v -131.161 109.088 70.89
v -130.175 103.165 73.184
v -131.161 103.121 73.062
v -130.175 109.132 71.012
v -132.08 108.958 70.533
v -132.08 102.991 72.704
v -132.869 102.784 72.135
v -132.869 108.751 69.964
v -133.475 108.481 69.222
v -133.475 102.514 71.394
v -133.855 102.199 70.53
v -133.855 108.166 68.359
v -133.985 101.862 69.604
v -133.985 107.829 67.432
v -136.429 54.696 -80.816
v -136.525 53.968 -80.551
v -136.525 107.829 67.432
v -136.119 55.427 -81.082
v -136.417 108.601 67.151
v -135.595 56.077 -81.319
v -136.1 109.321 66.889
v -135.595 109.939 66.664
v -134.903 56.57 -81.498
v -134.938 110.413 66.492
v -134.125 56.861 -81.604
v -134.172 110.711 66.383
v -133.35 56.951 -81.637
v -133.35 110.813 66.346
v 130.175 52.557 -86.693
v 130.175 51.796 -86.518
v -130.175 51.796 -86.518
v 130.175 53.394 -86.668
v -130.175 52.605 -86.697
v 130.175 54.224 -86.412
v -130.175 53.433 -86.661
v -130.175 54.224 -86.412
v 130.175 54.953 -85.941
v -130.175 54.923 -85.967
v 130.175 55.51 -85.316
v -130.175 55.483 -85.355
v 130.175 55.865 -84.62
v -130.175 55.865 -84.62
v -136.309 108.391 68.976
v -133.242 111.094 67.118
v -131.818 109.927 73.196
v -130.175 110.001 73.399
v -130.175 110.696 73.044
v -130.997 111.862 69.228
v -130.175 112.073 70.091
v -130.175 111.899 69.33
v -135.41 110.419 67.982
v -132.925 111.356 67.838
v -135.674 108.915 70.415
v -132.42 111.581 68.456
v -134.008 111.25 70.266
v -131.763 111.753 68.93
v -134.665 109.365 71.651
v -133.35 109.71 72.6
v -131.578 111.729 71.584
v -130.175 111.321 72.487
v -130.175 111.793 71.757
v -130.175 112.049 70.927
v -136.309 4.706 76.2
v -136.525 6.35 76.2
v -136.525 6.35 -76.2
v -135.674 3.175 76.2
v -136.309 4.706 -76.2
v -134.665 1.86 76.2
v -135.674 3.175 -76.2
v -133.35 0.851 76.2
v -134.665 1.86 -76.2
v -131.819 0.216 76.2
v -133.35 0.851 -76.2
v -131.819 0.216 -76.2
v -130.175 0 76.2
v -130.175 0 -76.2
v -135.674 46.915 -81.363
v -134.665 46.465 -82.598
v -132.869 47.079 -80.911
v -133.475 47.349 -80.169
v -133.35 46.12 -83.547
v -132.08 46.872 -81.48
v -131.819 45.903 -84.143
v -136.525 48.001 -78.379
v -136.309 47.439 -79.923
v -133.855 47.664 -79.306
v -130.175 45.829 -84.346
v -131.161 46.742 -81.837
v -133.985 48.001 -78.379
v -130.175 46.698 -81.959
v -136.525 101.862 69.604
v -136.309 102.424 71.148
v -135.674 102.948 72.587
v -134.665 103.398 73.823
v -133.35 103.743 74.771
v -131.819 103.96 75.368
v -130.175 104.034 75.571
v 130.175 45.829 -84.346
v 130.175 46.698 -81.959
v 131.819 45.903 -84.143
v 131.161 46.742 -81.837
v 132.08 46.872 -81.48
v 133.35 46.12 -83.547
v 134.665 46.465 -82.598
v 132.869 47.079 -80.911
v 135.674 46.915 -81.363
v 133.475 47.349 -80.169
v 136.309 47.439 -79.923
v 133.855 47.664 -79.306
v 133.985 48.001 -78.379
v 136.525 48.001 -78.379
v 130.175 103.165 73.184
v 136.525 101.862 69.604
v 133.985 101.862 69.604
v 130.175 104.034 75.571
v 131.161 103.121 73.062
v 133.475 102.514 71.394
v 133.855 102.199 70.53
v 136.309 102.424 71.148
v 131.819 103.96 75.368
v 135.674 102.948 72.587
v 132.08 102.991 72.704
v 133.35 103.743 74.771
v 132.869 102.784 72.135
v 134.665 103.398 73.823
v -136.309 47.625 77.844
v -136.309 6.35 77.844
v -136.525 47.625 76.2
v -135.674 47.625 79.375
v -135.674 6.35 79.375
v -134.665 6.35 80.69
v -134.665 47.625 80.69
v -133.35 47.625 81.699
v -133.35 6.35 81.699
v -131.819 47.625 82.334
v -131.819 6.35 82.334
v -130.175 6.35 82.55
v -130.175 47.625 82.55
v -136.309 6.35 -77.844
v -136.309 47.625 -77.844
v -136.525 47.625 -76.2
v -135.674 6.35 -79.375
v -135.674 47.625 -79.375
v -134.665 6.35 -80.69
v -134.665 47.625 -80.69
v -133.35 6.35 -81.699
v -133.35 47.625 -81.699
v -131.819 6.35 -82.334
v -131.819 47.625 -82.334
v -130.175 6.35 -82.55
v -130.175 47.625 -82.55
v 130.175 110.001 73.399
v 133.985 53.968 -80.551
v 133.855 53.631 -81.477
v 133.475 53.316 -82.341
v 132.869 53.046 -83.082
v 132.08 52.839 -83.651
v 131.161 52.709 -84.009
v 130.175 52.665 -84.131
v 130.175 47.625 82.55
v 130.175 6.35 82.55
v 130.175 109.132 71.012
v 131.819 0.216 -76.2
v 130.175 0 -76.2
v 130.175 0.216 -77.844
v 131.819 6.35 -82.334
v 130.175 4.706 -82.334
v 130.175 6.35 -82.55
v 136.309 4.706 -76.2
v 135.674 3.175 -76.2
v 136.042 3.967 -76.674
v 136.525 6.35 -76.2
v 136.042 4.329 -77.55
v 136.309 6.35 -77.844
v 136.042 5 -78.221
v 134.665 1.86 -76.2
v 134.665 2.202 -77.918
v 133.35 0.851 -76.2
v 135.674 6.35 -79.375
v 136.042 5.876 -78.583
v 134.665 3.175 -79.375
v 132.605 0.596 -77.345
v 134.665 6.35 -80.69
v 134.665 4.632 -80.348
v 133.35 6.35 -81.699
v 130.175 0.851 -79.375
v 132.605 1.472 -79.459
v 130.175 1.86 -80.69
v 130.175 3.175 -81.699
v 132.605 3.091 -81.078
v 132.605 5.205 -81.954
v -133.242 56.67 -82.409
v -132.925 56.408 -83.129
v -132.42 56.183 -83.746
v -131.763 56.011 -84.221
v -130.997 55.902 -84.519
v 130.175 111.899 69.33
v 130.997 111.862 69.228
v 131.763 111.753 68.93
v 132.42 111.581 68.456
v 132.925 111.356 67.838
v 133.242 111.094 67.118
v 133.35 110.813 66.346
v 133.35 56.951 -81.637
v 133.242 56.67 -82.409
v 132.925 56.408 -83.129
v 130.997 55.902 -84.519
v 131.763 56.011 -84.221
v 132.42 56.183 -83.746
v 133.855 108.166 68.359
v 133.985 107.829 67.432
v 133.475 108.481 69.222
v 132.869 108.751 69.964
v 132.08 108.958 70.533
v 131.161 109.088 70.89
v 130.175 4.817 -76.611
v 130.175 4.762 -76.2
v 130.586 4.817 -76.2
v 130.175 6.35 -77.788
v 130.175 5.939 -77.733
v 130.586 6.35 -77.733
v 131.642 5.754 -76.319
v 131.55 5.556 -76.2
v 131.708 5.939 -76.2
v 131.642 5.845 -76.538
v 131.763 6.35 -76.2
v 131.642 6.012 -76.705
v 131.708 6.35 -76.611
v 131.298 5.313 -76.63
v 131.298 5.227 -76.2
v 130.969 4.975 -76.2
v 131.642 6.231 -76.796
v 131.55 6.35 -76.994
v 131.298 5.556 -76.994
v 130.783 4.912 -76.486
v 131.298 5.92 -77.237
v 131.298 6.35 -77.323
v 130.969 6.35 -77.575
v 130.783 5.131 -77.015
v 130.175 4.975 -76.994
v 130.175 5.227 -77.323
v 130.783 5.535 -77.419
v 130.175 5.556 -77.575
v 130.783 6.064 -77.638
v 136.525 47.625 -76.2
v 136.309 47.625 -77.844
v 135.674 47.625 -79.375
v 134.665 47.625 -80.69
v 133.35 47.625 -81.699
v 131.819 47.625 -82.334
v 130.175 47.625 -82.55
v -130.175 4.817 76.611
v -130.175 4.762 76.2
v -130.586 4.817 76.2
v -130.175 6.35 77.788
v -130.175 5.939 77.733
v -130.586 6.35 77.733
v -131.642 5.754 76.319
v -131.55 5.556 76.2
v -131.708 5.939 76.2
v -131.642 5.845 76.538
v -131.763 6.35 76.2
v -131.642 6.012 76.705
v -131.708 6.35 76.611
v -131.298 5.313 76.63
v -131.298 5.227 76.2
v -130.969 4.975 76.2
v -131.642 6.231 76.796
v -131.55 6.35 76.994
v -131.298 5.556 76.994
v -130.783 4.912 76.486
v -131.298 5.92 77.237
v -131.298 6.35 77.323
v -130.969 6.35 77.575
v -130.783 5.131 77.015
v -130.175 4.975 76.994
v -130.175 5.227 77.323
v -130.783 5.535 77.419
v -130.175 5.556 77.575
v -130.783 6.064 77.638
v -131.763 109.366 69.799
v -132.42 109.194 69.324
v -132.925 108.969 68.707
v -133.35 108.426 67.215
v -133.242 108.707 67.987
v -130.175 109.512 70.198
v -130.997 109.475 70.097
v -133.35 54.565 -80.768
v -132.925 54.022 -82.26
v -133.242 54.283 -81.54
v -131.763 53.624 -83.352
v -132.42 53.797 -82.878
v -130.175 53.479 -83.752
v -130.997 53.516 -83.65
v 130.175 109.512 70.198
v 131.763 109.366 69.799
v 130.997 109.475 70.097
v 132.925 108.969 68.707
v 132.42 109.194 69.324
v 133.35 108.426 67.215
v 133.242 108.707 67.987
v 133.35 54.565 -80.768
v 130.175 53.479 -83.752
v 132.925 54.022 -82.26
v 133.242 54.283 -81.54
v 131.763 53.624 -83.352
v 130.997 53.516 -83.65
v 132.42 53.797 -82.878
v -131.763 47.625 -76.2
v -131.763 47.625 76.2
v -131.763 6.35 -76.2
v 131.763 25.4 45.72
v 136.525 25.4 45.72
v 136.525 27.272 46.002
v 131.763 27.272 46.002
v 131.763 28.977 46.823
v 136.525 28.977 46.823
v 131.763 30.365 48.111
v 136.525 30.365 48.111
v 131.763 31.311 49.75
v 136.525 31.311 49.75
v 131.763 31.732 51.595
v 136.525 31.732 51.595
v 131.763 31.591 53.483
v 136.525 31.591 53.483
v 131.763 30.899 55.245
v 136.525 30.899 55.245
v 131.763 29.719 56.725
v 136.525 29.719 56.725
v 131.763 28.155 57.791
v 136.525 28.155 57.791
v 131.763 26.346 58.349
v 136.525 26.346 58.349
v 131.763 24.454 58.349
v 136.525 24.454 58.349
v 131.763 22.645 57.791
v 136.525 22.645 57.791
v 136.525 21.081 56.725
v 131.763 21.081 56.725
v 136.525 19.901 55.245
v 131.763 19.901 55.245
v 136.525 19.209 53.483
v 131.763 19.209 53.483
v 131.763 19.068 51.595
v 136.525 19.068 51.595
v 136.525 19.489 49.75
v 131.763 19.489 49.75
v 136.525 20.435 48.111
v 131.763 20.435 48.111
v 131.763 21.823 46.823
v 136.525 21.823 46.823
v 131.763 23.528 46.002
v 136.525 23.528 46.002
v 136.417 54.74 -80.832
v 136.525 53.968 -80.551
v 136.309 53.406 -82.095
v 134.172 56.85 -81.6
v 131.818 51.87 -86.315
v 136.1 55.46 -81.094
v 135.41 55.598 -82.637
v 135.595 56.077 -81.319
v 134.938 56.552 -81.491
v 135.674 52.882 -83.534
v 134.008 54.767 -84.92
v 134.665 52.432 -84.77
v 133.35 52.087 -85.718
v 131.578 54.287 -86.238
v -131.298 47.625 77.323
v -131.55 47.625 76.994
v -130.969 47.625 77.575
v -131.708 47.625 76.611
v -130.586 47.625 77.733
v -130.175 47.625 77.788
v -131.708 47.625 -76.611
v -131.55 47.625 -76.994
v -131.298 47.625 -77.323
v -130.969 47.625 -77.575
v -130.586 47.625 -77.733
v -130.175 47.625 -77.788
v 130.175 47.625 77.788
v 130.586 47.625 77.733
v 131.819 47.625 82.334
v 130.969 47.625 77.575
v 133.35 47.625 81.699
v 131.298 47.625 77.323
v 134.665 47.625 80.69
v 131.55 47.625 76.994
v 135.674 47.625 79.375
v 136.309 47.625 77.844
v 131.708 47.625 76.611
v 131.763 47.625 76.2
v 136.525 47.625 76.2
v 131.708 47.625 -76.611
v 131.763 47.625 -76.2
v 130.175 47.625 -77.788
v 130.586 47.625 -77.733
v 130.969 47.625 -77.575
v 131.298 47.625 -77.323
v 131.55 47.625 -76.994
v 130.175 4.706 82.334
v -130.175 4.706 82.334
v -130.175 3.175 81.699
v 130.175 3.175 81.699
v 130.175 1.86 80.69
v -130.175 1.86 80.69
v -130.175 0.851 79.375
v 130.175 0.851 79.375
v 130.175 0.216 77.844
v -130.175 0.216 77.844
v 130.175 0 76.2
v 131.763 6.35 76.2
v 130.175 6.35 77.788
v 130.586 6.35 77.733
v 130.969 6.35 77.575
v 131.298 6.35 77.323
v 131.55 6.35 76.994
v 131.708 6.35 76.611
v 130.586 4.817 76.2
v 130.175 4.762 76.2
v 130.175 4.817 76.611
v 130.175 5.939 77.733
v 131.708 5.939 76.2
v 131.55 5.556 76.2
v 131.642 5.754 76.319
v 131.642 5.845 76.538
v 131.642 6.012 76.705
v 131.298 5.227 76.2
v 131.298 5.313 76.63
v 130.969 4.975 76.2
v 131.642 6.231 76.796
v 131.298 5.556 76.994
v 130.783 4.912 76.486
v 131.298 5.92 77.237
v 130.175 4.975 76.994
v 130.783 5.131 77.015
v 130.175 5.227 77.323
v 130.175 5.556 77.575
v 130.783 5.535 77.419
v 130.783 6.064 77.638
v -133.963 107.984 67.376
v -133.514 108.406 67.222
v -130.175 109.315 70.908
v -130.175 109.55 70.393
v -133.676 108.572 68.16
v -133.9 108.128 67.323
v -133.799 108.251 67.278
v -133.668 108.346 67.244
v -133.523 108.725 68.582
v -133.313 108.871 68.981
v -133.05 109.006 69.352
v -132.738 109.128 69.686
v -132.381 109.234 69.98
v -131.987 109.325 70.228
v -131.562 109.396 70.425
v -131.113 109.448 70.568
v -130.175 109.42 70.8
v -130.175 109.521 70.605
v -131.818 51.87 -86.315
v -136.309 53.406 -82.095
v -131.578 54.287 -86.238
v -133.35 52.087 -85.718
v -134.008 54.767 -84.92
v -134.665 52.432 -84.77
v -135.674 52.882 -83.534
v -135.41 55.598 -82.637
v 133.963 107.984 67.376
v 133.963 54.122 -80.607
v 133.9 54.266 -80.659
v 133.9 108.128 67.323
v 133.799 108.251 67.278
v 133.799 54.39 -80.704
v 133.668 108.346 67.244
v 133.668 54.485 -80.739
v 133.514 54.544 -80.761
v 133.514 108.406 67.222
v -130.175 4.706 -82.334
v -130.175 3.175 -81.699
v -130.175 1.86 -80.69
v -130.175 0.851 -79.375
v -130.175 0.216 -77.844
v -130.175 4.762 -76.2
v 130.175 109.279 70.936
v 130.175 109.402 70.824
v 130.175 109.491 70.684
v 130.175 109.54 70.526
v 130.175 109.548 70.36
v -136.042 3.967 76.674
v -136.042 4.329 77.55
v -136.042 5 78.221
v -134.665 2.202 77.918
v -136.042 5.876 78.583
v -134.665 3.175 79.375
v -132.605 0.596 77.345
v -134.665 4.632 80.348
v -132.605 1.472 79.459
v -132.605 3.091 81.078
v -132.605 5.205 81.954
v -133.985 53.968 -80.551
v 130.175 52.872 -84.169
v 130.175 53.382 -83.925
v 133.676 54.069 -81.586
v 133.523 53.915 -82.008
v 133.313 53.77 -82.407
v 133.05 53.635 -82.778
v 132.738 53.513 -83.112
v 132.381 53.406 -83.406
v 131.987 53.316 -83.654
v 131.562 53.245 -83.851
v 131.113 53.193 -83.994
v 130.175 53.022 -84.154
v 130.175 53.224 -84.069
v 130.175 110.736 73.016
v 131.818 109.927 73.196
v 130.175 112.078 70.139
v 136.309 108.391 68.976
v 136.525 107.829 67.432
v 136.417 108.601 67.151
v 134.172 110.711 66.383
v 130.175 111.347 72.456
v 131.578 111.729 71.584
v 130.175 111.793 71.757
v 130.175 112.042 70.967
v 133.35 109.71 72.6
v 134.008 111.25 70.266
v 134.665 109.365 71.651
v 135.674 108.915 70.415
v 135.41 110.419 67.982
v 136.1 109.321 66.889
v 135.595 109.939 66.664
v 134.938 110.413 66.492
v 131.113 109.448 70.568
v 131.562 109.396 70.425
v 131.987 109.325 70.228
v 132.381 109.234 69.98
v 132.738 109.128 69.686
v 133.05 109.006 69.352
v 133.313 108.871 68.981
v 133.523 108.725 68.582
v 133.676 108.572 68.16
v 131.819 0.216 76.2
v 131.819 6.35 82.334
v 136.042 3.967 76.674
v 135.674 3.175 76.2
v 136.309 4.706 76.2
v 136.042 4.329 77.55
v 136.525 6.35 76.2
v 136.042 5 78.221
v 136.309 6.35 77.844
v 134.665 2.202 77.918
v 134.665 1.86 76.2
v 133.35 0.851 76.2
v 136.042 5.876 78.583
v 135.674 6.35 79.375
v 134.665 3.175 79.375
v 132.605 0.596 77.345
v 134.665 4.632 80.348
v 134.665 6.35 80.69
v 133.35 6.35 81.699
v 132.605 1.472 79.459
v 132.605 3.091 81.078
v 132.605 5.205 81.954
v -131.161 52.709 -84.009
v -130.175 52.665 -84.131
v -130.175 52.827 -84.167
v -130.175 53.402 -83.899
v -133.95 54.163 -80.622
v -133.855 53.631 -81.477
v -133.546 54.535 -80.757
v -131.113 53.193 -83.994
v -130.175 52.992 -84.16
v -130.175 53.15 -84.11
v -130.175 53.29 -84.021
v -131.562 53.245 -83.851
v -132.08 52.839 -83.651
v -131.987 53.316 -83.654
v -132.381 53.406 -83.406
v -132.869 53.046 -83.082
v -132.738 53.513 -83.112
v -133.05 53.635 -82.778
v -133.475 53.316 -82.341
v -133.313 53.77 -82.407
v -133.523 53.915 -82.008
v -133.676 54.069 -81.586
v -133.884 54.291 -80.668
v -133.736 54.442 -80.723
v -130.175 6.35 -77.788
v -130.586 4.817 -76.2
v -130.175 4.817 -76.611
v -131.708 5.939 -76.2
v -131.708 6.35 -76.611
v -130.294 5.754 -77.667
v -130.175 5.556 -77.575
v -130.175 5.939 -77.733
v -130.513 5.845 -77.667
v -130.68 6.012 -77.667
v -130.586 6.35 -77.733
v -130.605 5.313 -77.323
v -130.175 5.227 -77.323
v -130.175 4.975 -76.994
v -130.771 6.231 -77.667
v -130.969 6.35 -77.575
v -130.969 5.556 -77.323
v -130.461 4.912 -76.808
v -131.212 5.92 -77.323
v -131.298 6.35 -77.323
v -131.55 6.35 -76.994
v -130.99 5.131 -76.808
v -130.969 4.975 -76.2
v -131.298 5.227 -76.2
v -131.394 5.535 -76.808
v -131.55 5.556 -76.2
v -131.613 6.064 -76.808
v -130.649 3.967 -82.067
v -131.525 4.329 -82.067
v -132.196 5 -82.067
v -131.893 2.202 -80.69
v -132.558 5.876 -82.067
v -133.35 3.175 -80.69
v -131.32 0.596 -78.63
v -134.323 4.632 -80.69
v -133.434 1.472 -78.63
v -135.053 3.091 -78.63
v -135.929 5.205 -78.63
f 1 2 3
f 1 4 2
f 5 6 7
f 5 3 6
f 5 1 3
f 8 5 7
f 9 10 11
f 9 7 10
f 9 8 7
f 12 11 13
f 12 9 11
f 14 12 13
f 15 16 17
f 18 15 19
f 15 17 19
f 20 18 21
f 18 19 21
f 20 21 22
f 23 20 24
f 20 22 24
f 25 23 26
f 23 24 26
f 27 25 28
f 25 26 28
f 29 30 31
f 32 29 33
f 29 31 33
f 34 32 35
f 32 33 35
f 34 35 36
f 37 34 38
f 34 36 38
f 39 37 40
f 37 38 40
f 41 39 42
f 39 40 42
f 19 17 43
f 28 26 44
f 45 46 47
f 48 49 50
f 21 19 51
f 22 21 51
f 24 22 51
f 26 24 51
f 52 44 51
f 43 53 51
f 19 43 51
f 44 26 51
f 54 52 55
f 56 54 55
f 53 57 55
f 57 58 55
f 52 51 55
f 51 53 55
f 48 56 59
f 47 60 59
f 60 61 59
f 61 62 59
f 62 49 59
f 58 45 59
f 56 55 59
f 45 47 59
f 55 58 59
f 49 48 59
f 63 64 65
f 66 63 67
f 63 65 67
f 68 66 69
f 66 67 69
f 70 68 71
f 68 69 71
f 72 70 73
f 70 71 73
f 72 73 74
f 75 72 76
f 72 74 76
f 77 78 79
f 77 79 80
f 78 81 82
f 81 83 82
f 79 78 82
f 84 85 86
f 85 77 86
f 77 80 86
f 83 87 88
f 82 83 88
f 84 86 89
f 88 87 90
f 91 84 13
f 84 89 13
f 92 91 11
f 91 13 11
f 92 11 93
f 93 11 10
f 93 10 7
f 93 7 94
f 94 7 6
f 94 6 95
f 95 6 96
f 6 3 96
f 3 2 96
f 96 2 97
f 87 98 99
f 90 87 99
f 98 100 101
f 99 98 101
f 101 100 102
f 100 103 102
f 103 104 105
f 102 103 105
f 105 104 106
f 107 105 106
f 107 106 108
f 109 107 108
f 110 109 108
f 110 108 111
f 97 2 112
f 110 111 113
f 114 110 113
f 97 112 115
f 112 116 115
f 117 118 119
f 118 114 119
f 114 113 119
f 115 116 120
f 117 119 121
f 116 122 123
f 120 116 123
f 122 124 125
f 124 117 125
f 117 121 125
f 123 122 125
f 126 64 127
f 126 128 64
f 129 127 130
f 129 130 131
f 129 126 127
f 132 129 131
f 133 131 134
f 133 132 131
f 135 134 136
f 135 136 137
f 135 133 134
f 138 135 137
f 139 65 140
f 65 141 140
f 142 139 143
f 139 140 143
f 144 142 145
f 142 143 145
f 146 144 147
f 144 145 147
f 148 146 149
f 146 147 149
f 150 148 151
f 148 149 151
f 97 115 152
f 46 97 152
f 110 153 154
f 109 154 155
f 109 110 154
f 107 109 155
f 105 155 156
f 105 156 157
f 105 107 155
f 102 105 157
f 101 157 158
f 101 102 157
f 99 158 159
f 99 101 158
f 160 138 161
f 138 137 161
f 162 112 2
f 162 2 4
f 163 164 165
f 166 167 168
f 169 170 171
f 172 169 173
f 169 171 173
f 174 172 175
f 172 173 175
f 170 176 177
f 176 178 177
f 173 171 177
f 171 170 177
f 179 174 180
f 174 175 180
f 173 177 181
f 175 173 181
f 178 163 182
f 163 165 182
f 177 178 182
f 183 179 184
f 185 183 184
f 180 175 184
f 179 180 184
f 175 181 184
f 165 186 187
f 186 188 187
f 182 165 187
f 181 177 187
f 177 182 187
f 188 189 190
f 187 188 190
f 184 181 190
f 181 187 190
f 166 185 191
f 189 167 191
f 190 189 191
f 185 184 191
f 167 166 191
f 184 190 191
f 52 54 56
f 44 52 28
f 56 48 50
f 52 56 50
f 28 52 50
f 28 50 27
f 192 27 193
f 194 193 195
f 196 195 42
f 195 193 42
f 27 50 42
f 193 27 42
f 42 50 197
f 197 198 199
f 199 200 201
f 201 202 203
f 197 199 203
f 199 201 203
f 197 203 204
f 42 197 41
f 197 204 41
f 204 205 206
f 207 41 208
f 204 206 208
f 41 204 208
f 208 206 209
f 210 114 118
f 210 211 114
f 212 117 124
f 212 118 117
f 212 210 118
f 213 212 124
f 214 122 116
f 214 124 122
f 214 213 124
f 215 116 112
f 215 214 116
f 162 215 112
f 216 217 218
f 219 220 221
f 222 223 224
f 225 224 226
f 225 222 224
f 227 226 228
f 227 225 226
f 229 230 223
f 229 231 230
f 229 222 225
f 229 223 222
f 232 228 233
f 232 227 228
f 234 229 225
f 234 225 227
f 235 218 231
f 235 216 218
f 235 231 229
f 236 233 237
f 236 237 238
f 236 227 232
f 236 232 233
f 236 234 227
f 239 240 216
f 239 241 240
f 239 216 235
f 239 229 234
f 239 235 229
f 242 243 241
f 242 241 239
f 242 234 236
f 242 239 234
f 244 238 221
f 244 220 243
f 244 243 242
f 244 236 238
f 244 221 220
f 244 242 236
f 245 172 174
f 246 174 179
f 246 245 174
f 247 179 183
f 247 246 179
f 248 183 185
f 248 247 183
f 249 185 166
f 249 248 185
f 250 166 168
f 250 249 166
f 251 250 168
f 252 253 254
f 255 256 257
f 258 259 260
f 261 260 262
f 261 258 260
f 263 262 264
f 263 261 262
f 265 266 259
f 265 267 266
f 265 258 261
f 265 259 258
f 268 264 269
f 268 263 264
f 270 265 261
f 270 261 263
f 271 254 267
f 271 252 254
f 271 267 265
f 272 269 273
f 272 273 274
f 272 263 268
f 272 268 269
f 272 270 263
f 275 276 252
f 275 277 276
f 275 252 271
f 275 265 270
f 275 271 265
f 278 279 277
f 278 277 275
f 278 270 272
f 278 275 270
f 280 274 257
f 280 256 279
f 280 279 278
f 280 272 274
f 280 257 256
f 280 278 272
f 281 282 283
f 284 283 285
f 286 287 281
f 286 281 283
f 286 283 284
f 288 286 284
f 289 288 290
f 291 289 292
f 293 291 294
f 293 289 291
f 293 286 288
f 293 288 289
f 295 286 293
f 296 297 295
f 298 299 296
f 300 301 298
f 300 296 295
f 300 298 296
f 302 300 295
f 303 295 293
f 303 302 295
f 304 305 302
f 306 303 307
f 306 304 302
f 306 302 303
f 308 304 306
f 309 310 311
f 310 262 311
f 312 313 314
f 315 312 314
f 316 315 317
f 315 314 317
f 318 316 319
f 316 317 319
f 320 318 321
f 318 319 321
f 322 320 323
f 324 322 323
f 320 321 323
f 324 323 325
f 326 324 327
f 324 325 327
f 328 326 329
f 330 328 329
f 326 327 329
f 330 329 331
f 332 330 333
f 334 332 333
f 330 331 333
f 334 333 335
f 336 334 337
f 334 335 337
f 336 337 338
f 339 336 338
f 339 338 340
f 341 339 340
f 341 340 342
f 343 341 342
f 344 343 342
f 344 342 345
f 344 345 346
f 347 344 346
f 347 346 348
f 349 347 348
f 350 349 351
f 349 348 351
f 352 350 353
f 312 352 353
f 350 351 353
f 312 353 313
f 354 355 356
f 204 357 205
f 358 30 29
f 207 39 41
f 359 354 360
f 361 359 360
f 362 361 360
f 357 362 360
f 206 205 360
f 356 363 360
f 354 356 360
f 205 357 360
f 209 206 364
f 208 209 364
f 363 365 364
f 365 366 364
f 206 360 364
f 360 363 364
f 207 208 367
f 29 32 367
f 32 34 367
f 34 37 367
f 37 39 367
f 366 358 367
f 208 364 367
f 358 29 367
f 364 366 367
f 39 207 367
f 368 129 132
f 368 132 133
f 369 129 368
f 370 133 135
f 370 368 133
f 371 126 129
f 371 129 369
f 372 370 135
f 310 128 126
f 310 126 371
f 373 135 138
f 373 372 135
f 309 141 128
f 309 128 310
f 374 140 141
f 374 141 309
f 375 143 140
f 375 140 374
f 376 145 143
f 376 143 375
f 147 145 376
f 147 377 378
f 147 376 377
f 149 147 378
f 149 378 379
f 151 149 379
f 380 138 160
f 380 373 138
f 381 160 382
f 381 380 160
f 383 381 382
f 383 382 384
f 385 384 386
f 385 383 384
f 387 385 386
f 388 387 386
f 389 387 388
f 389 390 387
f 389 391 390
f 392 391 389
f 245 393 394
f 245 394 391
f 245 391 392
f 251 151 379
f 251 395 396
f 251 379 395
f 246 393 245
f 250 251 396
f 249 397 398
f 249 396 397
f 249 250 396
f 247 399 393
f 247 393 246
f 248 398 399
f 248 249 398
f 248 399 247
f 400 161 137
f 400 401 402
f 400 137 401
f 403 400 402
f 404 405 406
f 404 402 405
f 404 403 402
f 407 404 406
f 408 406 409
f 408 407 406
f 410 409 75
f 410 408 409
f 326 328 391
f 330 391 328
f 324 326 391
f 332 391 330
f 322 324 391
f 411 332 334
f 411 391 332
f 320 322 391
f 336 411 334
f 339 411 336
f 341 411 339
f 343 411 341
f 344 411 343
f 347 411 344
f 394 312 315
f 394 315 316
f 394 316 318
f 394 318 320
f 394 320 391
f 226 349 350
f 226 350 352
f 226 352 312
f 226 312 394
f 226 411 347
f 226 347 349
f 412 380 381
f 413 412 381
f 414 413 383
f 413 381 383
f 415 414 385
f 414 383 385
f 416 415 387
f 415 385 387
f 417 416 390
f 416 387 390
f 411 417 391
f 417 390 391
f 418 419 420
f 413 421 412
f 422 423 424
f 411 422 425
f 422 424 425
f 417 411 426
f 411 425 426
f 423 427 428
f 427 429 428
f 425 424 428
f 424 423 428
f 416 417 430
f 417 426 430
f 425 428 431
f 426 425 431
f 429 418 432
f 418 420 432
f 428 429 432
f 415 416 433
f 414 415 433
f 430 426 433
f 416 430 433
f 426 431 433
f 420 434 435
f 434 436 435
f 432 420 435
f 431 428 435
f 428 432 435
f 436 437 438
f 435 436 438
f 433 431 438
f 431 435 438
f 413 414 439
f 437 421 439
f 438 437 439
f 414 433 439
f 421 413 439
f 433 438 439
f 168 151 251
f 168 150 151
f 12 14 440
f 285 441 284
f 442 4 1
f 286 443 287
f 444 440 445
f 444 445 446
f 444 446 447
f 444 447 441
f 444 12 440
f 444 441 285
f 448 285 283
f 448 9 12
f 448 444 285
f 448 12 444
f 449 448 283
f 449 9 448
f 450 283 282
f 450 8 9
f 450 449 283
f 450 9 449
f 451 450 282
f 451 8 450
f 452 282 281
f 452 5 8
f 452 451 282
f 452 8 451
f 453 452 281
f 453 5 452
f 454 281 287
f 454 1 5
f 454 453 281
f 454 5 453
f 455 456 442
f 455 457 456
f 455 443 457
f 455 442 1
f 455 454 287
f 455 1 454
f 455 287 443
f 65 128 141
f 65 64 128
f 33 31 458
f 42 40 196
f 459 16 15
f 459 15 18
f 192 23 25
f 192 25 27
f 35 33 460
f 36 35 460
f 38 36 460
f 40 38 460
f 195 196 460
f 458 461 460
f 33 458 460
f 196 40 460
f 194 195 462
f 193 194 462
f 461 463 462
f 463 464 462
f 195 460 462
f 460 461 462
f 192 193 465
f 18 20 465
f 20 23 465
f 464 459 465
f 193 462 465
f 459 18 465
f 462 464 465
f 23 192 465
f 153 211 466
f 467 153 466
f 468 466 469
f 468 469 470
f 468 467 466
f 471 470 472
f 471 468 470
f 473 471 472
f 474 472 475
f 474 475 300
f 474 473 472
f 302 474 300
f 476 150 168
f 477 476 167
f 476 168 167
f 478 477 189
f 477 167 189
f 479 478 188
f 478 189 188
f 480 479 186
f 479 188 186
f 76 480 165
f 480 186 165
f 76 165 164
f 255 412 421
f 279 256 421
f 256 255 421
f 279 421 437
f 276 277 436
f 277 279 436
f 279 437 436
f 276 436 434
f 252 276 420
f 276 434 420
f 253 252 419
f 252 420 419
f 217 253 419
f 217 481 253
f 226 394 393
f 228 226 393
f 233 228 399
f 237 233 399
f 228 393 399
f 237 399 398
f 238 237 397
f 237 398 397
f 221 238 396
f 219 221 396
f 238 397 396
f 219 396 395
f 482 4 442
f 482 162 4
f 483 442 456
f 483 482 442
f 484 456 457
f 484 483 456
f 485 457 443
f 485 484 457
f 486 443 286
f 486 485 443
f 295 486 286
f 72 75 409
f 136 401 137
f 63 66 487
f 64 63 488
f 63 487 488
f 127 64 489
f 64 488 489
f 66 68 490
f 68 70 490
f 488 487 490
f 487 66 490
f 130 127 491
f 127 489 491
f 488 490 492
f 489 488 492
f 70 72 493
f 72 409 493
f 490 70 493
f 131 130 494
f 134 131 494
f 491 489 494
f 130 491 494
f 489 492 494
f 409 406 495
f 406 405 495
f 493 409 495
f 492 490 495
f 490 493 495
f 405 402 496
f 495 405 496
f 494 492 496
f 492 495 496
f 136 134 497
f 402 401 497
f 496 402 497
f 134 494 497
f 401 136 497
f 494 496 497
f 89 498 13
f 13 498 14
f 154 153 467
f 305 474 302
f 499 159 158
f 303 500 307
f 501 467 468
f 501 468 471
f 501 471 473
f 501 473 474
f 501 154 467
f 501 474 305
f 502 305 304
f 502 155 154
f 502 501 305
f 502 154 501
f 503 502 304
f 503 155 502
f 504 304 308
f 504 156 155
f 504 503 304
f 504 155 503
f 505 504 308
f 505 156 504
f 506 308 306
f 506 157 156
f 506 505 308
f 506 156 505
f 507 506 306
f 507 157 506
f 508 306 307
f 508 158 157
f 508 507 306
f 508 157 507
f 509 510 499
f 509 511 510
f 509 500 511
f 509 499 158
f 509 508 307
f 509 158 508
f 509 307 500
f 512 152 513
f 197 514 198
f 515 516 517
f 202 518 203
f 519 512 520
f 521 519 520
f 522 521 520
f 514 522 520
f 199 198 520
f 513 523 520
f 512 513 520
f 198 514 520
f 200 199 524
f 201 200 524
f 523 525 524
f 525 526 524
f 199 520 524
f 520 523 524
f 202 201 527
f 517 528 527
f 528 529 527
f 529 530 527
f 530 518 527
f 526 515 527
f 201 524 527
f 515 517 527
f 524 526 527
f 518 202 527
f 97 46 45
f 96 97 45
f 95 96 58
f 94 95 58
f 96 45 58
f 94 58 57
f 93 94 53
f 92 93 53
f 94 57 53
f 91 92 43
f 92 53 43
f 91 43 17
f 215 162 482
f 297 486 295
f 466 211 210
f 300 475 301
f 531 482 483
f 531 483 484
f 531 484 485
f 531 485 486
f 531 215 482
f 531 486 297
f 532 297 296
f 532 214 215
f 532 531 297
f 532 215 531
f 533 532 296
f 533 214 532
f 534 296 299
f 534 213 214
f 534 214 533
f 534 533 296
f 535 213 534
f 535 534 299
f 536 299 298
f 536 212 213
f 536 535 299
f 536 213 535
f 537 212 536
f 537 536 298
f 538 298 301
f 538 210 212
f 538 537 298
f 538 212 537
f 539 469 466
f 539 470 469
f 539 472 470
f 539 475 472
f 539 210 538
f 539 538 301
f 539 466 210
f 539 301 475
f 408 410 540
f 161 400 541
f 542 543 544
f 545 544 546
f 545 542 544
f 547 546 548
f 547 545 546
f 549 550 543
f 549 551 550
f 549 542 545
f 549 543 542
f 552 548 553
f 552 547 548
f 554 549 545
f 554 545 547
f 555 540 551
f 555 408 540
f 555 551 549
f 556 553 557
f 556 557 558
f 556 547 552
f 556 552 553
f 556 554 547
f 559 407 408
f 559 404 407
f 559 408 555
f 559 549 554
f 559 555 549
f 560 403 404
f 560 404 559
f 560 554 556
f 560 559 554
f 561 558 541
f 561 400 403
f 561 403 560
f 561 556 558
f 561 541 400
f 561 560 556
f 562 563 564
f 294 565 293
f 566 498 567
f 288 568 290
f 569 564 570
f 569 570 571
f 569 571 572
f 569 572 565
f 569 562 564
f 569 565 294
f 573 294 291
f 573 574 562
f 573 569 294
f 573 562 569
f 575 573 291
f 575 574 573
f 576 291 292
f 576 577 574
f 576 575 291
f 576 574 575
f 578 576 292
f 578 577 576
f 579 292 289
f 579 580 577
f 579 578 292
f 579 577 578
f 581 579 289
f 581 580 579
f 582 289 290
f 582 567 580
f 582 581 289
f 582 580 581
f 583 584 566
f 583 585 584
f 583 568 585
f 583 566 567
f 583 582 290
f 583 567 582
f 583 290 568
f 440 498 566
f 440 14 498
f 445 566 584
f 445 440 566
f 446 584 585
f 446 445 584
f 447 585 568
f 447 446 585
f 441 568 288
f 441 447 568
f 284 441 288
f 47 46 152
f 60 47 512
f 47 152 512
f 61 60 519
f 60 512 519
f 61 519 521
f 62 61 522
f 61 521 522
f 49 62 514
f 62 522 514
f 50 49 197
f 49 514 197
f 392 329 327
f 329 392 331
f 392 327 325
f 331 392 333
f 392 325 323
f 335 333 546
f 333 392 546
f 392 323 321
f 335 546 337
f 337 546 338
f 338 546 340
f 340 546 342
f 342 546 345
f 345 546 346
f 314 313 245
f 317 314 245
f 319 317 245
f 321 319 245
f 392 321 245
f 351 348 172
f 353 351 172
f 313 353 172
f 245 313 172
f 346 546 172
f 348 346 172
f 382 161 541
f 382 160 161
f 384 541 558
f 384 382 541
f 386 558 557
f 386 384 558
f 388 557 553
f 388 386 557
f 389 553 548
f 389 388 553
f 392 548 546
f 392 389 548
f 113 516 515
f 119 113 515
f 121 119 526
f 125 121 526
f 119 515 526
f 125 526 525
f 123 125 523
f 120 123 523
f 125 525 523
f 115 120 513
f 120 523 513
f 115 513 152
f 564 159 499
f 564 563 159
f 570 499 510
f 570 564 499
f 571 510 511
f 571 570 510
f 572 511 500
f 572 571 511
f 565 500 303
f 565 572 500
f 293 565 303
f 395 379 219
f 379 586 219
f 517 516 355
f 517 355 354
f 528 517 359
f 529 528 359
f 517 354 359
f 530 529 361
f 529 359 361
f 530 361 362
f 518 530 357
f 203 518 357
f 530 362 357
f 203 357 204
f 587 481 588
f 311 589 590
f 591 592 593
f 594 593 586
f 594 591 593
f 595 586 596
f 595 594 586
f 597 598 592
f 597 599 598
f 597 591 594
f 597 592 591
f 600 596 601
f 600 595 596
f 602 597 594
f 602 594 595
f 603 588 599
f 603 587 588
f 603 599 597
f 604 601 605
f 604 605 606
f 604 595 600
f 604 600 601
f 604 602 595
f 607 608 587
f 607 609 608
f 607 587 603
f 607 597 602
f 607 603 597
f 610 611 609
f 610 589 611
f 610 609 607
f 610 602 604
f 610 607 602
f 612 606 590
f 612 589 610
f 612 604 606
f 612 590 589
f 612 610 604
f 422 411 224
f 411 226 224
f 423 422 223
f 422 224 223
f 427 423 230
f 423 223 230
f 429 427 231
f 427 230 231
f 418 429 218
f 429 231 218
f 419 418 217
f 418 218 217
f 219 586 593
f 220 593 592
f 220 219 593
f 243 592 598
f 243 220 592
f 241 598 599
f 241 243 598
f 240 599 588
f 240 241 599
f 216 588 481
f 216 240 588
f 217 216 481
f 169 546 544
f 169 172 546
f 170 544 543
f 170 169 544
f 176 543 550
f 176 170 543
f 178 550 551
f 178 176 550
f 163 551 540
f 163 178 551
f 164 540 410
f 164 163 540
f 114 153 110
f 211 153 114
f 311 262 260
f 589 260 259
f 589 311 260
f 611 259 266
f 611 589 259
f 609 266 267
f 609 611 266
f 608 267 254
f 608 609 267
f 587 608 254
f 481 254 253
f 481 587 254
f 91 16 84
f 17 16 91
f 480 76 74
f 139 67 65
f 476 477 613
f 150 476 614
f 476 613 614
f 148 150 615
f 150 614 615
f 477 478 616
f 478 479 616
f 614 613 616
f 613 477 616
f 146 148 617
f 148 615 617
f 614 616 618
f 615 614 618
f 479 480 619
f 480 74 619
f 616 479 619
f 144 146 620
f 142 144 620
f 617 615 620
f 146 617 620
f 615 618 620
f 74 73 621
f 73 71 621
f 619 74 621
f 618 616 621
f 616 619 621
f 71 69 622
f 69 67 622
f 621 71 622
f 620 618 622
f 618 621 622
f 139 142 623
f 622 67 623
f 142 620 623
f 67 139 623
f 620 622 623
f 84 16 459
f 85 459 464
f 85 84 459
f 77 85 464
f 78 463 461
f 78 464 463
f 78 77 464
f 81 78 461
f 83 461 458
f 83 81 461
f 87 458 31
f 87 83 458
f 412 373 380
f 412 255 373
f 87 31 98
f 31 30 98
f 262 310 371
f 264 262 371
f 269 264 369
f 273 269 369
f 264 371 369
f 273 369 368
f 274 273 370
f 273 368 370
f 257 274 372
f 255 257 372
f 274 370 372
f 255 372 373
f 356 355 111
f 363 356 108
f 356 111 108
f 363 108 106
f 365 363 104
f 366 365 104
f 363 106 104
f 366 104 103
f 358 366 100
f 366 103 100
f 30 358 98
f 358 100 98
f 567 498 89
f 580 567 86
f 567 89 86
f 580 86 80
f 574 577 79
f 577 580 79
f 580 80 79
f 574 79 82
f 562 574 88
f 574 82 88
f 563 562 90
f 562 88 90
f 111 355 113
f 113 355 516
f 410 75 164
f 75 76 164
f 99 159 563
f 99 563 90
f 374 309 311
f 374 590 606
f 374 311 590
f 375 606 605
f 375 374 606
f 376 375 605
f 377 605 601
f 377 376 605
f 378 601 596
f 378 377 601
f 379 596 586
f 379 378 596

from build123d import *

# Parameters (mm, degrees)
SKETCH1_W                       = 273.05
SKETCH1_H                       = 165.1
BOSS_EXTRUDE1_DEPTH             = 47.625
FILLET1_R                       = 6.35
SHELL1_T                        = -4.7625
LID_OPENING_ANGLE_CONTROL_DEPTH = 136.525
FILLET2_R                       = 6.35
FILLET3_R                       = 3.175
SHELL2_T                        = -2.54
SKETCH3_R                       = 6.35
CUT_EXTRUDE1_DEPTH              = 4.7625


with BuildPart() as part:
    # Sketch1 → Boss-Extrude1 (new body)
    with BuildSketch(Plane(origin=(0, 0, 0), x_dir=(1, 0, 0), z_dir=(0, 1, 0))):
        Rectangle(SKETCH1_W, SKETCH1_H)
    extrude(amount=BOSS_EXTRUDE1_DEPTH)

    # Fillet1
    fillet1_edges = [part.edges().sort_by_distance(p)[0] for p in [
        (0, 0, 82.55),
        (-136.525, 0, 0),
        (0, 0, -82.55),
        (136.525, 0, 0),
        (136.525, 23.8125, 82.55),
        (-136.525, 23.8125, 82.55),
        (-136.525, 23.8125, -82.55),
        (136.525, 23.8125, -82.55),
    ]]
    fillet(fillet1_edges, radius=FILLET1_R)

    # Shell1
    shell1_openings = [part.faces().sort_by_distance(p)[0] for p in [
        (0, 47.625, 0),
    ]]
    offset(amount=SHELL1_T, openings=shell1_openings, kind=Kind.INTERSECTION)

    # Sketch3 → Cut-Extrude1 (cut)
    with BuildSketch(Plane(origin=(136.525, 0, 0), x_dir=(0, 0, -1), z_dir=(1, 0, 0))):
        with Locations((-52.07, 25.4)):
            Circle(SKETCH3_R)
    extrude(amount=-CUT_EXTRUDE1_DEPTH, mode=Mode.SUBTRACT)


with BuildPart() as body_2:
    # Sketch2 → LID OPENING ANGLE CONTROL (new, symmetric)
    with BuildSketch(Plane(origin=(0, 0, 0), x_dir=(0, 0, -1), z_dir=(1, 0, 0))):
        Polygon((84.346051224, 45.828948776), (-75.570838981, 104.033936767), (-72.313097116, 112.98450898), (87.603793089, 54.779520989), align=None)
    extrude(amount=LID_OPENING_ANGLE_CONTROL_DEPTH, both=True)

    # Fillet2
    fillet2_edges = [body_2.edges().sort_by_distance(p)[0] for p in [
        (136.525, 108.509222873, 73.941968049),
        (136.525, 50.304234882, -85.974922157),
        (-136.525, 108.509222873, 73.941968049),
        (-136.525, 50.304234882, -85.974922157),
    ]]
    fillet(fillet2_edges, radius=FILLET2_R)

    # Fillet3
    fillet3_edges = [body_2.edges().sort_by_distance(p)[0] for p in [
        (136.525, 83.882014984, -7.645347987),
        (-136.525, 83.882014984, -7.645347987),
        (0, 112.98450898, 72.313097116),
        (0, 54.779520989, -87.603793089),
        (-134.665128061, 112.348395313, 70.565389179),
        (134.665128061, 112.348395313, 70.565389179),
        (-134.665128061, 55.415634656, -85.856085152),
        (134.665128061, 55.415634656, -85.856085152),
    ]]
    fillet(fillet3_edges, radius=FILLET3_R)

    # Shell2
    shell2_openings = [body_2.faces().sort_by_distance(p)[0] for p in [
        (0, 74.931442771, -4.387606122),
    ]]
    offset(amount=SHELL2_T, openings=shell2_openings, kind=Kind.INTERSECTION)


solid = Compound([part.part, body_2.part])
